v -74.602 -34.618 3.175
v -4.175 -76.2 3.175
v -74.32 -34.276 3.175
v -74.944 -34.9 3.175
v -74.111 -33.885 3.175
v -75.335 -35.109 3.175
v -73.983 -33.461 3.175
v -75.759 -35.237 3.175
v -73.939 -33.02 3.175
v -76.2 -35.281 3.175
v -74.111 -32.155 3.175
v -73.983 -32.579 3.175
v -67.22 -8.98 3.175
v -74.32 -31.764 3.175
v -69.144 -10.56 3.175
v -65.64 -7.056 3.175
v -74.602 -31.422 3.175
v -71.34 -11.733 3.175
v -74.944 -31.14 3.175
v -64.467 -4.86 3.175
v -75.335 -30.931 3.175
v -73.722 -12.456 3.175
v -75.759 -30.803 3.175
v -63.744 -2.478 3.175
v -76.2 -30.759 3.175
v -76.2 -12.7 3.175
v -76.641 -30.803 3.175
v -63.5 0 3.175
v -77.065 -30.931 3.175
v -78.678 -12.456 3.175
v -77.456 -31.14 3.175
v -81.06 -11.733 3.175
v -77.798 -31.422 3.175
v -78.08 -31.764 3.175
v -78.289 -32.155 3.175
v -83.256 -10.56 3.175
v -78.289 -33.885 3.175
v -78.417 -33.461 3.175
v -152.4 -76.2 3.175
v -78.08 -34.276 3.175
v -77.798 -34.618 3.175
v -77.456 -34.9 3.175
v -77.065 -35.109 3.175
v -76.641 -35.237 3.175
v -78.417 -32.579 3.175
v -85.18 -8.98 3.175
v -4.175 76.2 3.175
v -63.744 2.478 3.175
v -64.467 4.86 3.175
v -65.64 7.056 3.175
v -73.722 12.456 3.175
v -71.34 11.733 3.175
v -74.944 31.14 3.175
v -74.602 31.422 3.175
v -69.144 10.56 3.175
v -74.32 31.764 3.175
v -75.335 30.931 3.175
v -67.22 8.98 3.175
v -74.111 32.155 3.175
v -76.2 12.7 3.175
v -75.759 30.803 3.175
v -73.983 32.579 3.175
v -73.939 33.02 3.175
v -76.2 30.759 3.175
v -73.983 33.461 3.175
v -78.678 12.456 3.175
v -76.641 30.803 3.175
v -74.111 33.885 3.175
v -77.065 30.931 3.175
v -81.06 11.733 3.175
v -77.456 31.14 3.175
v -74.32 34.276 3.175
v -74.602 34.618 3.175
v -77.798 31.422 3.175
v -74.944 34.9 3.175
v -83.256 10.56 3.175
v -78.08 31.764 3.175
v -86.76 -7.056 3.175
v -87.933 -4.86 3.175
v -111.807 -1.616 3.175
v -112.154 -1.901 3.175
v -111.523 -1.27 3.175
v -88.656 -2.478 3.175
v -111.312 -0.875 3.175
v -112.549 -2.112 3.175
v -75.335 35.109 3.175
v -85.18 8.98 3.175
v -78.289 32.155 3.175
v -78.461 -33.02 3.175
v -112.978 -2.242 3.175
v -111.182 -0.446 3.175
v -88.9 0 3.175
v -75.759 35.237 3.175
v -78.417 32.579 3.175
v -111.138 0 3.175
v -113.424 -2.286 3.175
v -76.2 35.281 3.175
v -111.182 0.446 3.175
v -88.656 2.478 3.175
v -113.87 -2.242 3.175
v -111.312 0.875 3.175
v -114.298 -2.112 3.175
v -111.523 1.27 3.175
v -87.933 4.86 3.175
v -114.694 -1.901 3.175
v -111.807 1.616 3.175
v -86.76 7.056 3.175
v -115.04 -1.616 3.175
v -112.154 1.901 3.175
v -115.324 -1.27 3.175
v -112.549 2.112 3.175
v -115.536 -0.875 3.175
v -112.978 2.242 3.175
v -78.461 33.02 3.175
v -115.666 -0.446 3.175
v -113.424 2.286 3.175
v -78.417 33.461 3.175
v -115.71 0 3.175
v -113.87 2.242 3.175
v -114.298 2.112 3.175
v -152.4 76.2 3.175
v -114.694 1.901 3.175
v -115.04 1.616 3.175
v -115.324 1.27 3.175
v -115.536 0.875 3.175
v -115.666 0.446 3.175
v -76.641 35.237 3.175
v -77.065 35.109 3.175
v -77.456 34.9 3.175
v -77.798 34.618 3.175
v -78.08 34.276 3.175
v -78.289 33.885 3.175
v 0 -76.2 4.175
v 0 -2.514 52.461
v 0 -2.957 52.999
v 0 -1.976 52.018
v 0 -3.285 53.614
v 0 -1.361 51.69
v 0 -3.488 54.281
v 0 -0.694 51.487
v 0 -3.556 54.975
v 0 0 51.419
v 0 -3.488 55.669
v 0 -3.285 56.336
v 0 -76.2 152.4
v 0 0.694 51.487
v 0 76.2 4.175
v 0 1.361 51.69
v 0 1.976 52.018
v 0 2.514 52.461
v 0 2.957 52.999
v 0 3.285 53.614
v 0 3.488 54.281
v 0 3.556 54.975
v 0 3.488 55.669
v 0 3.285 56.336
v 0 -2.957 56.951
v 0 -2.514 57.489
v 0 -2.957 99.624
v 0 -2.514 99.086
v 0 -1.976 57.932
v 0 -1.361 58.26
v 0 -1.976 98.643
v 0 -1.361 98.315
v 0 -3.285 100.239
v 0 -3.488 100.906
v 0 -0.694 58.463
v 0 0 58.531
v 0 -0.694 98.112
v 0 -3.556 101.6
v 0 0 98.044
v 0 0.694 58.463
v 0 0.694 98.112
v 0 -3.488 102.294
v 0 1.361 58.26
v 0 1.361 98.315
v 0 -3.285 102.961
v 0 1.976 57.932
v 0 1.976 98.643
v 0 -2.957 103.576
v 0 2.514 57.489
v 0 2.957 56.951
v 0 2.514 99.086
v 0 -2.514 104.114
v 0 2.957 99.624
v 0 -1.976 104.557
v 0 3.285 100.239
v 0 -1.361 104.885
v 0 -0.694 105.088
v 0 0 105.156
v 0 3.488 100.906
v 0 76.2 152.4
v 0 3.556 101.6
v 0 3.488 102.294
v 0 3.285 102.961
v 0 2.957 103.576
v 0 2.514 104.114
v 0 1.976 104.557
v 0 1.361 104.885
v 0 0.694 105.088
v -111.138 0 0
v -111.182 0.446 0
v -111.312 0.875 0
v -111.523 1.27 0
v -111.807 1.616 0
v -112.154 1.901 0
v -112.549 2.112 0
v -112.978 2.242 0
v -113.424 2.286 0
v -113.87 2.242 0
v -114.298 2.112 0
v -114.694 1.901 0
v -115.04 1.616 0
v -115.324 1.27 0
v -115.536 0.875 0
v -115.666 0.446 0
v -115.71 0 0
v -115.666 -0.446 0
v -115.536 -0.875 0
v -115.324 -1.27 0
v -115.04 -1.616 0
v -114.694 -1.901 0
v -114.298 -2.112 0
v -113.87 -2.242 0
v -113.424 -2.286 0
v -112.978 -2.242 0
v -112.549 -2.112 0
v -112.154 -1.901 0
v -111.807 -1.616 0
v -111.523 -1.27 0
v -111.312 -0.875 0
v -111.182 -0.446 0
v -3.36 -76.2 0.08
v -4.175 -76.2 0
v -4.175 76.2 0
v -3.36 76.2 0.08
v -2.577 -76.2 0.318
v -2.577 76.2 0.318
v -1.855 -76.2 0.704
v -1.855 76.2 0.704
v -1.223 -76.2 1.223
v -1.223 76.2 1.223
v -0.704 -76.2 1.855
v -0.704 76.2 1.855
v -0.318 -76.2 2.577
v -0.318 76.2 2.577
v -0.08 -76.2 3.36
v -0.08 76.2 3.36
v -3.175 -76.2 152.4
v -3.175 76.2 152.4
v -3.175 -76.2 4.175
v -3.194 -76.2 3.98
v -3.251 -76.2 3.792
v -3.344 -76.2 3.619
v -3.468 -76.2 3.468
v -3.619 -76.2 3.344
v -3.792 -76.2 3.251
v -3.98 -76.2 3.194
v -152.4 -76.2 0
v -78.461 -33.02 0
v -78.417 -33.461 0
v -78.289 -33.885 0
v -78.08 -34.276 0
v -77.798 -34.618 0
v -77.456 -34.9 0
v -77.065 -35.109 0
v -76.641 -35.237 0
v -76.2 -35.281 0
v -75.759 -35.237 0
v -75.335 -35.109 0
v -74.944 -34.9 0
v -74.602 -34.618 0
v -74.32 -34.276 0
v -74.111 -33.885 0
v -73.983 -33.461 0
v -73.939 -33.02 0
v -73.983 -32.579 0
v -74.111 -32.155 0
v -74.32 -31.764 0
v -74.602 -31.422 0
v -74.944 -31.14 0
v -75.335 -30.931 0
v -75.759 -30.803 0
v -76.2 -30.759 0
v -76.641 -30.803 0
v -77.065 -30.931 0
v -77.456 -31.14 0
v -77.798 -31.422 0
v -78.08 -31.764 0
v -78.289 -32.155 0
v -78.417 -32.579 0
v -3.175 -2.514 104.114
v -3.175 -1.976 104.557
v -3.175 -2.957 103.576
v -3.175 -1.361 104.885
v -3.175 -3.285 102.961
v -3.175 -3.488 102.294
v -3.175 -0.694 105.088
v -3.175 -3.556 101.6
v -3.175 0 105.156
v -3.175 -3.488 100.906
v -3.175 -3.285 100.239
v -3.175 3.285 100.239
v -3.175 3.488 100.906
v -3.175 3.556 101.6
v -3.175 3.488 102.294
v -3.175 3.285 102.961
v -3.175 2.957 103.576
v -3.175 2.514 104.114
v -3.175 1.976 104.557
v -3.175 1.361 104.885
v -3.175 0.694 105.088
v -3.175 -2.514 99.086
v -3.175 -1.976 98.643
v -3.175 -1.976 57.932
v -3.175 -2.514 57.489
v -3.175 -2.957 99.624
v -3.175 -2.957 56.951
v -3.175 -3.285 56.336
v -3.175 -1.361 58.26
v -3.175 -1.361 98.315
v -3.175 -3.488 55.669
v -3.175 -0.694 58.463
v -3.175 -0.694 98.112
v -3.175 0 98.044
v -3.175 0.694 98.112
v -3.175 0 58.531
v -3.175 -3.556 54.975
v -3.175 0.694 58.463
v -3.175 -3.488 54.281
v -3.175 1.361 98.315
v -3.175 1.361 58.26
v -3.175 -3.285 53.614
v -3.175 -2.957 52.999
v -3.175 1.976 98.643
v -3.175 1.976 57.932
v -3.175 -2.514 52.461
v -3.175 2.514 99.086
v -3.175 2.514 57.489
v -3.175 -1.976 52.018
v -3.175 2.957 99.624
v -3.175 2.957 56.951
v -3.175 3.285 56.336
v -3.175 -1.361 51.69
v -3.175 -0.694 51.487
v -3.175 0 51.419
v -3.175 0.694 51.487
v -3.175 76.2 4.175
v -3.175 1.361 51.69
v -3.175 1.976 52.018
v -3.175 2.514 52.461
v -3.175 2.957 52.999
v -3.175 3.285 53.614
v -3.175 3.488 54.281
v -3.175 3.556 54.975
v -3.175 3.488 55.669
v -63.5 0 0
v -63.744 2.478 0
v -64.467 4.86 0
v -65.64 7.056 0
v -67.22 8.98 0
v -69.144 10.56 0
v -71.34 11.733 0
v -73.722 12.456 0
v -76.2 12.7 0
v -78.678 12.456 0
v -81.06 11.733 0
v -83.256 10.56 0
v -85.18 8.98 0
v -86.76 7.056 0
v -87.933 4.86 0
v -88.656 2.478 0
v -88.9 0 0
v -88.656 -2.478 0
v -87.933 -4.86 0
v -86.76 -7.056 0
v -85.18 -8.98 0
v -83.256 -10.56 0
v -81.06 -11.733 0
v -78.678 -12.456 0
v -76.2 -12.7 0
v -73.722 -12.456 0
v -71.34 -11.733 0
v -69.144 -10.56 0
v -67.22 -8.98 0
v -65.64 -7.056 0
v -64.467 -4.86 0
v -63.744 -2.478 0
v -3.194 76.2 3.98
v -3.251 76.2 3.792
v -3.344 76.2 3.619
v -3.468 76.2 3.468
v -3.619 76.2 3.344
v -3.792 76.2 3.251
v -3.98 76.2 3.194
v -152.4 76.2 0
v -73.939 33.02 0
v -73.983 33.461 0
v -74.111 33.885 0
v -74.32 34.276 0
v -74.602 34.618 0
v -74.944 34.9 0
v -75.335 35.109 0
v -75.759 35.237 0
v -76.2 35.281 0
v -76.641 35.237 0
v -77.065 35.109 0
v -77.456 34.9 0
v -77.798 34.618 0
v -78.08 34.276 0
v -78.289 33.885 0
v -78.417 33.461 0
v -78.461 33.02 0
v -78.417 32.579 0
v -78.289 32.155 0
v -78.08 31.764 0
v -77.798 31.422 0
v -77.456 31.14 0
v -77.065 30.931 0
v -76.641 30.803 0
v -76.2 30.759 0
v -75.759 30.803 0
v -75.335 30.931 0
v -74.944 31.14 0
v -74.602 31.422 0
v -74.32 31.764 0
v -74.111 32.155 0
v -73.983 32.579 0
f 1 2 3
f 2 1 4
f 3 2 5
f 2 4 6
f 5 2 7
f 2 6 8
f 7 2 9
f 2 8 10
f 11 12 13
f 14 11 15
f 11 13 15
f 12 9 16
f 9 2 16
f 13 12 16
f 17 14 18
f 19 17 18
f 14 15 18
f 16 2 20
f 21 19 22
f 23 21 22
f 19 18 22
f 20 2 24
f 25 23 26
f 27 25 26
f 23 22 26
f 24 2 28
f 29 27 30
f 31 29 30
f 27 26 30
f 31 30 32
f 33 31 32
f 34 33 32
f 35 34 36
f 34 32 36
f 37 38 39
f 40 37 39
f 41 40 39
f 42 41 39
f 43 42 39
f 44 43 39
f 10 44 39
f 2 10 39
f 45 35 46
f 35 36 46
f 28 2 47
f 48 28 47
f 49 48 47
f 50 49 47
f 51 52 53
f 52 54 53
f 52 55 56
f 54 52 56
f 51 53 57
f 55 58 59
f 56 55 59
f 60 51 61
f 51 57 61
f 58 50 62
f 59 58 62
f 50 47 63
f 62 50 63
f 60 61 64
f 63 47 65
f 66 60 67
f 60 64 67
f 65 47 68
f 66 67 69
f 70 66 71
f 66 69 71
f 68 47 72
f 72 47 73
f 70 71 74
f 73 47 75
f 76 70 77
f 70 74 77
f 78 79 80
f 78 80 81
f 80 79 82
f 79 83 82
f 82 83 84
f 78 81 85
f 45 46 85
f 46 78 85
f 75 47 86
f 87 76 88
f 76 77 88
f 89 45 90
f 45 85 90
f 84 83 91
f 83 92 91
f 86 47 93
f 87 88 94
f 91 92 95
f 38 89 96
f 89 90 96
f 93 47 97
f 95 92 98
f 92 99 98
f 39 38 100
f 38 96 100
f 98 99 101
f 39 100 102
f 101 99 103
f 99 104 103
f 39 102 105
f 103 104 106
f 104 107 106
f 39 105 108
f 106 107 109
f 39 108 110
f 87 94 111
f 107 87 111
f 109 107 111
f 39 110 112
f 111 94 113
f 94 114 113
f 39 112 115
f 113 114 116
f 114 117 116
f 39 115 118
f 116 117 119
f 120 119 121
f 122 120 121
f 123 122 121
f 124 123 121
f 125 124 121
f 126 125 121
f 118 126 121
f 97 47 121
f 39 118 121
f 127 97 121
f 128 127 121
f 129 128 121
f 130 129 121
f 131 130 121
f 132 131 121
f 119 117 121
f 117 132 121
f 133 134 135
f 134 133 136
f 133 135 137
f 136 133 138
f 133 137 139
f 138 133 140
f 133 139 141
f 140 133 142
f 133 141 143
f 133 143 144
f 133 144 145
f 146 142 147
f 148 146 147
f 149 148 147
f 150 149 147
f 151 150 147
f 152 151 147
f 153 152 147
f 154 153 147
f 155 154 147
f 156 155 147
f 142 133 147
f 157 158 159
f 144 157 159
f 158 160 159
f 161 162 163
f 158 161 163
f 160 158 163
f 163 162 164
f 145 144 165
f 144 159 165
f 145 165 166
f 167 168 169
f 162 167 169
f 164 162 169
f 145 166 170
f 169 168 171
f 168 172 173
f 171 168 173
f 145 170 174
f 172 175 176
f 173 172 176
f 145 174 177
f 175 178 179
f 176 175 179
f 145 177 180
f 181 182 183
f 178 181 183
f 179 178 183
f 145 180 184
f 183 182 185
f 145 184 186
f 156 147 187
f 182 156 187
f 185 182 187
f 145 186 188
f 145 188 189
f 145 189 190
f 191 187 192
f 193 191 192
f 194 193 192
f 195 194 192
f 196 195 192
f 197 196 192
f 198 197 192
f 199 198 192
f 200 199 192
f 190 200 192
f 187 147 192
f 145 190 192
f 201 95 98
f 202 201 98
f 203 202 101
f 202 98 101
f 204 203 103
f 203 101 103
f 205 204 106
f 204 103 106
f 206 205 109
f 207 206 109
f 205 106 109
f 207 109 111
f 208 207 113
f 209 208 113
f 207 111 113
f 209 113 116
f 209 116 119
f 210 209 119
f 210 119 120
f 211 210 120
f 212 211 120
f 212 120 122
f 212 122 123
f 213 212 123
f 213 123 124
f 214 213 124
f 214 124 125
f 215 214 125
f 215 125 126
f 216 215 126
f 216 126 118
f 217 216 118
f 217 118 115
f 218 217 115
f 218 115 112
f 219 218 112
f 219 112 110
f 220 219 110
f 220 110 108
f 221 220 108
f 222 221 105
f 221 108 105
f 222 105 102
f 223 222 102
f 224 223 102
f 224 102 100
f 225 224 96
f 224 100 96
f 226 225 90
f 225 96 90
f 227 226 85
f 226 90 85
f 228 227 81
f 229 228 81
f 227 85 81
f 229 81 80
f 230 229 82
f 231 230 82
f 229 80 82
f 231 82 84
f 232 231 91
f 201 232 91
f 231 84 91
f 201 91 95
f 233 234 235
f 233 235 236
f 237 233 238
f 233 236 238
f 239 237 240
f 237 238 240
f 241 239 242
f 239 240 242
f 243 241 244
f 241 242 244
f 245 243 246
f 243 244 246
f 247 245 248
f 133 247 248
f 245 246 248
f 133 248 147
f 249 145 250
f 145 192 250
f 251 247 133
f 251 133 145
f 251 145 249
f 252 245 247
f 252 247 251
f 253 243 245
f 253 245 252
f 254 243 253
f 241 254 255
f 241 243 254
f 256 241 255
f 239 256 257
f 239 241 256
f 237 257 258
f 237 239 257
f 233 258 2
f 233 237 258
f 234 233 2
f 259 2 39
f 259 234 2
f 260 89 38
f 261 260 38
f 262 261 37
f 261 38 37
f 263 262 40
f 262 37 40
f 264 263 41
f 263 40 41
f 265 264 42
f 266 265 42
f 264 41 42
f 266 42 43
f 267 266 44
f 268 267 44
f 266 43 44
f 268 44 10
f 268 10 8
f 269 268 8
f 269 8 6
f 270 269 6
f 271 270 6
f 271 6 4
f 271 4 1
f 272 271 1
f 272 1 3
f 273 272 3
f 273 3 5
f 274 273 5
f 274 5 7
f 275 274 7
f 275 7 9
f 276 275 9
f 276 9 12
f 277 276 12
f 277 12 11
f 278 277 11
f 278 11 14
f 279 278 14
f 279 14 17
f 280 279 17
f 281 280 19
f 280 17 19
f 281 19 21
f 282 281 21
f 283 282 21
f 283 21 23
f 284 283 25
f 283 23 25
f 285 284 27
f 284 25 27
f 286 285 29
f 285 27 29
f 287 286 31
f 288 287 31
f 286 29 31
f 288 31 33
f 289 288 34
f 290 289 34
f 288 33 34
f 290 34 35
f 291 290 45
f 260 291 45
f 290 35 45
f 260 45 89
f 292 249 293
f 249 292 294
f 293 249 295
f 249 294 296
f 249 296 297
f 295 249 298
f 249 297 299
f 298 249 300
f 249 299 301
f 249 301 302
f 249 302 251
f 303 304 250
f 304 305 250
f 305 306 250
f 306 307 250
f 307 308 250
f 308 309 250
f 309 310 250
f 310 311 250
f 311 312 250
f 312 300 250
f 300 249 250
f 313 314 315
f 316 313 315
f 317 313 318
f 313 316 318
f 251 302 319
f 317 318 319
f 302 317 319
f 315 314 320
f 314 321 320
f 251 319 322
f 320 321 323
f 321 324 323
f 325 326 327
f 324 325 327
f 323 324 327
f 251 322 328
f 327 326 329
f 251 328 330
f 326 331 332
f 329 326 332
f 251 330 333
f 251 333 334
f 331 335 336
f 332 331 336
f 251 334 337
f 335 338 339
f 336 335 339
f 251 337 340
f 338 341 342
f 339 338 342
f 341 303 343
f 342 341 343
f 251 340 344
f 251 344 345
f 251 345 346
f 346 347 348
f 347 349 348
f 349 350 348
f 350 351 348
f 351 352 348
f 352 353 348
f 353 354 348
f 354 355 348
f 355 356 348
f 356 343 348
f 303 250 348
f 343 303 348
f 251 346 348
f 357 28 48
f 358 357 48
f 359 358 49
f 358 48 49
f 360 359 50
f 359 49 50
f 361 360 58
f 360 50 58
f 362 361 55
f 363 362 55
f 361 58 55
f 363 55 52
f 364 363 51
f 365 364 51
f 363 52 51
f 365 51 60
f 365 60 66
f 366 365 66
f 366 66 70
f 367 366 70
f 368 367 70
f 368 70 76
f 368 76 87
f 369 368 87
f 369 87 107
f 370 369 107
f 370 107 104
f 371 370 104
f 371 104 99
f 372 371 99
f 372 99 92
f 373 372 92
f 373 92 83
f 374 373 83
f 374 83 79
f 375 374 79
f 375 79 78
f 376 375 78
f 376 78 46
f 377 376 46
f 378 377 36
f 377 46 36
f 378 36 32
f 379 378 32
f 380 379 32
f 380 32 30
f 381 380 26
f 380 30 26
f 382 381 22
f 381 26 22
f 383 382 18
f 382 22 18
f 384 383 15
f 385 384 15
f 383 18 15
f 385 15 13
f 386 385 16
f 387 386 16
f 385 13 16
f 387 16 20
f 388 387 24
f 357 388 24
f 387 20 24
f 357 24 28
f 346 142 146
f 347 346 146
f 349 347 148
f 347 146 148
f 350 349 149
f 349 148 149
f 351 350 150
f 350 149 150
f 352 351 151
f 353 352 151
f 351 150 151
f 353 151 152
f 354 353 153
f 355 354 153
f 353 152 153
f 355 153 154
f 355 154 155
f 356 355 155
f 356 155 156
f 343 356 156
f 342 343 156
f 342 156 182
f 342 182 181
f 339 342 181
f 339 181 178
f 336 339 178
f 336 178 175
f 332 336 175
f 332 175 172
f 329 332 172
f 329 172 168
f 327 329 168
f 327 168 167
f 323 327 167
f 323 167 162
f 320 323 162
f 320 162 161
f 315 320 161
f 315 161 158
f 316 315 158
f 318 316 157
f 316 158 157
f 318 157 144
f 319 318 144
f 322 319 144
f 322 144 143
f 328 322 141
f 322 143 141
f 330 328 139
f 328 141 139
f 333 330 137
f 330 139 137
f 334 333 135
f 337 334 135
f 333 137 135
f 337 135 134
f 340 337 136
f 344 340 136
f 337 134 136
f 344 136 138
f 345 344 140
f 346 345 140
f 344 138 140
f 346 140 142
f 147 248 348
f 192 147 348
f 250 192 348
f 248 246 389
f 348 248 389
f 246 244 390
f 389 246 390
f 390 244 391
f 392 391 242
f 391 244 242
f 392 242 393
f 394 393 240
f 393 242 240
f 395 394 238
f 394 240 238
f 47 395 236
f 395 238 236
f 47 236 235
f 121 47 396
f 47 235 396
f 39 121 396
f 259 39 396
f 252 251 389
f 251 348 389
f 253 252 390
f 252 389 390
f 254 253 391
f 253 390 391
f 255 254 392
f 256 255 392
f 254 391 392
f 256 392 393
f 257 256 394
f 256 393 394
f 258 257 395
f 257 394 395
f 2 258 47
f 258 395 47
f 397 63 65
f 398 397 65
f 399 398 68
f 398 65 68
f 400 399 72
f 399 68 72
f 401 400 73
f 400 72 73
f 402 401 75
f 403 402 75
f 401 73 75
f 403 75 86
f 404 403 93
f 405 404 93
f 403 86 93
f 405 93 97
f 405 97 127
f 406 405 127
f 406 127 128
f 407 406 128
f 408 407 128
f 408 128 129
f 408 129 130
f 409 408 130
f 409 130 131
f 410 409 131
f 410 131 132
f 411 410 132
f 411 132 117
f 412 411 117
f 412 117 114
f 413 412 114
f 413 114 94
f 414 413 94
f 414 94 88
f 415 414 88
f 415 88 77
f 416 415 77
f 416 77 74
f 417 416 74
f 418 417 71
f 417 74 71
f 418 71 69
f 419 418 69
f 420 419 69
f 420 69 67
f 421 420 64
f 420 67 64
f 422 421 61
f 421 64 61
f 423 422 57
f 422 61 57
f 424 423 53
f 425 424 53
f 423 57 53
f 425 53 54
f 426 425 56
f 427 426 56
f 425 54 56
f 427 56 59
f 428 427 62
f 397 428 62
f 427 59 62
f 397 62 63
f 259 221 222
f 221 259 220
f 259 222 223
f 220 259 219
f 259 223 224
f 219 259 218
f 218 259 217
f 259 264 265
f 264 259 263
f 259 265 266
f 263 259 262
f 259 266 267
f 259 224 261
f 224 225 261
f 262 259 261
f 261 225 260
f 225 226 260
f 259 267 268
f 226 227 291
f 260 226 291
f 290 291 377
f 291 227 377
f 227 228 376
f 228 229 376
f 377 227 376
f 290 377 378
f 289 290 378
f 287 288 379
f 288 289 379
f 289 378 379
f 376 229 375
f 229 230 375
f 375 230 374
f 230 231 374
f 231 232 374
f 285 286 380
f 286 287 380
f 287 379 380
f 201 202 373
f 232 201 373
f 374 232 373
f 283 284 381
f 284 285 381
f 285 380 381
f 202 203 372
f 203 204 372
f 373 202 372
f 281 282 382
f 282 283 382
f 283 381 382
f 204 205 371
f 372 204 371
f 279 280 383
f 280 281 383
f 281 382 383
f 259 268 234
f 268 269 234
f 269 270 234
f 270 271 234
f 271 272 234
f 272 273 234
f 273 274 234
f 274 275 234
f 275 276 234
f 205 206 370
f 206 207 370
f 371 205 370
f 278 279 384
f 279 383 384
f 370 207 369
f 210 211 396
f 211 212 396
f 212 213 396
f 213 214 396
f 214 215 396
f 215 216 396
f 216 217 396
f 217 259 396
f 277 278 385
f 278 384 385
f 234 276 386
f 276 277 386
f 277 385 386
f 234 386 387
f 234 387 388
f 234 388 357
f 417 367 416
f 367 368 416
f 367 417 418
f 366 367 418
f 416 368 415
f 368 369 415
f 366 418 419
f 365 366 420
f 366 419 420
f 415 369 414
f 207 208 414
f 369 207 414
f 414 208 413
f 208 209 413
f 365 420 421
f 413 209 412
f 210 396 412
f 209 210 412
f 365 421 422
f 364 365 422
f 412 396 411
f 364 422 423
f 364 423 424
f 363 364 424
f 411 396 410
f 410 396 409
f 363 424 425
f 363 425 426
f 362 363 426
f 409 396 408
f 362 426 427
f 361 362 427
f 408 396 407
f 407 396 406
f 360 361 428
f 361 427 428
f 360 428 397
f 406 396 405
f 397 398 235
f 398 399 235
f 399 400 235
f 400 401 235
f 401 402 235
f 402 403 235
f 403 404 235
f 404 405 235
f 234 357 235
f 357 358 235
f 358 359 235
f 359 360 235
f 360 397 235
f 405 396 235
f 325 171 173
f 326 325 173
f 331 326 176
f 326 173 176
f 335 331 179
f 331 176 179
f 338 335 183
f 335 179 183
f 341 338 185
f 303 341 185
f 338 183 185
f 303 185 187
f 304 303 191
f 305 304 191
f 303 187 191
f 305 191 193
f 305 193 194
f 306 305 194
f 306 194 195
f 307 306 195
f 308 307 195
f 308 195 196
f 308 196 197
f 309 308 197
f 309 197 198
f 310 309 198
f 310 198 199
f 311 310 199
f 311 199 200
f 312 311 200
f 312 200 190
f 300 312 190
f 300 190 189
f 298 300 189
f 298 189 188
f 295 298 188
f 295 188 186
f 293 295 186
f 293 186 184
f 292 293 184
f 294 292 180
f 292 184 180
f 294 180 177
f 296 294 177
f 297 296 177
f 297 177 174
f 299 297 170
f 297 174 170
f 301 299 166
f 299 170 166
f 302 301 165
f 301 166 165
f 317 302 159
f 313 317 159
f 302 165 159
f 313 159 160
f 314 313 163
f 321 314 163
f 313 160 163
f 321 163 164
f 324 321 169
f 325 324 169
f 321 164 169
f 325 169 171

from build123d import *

# Parameters (mm, degrees)
BASE_FLANGE1_DEPTH = 76.2
SKETCH6_R          = 12.7
CUT_EXTRUDE1_DEPTH = 227.495696703
SKETCH7_R          = 2.2606
CUT_EXTRUDE2_DEPTH = 227.495696703
SKETCH9_R          = 2.286
CUT_EXTRUDE3_DEPTH = 227.495696703
SKETCH10_R         = 3.556
CUT_EXTRUDE4_DEPTH = 229.6


# Sheet-metal steps are written as plain solids
with BuildPart() as part:
    # Sketch1 → Base-Flange1 (new, symmetric)
    with BuildSketch(Plane(origin=(0, 0, 0), x_dir=(1, 0, 0), z_dir=(0, 1, 0))):
        with BuildLine():
            Line((-152.4, 0), (-4.175, 0))
            ThreePointArc((-4.175, 0), (-1.222829189, -1.222829189), (0, -4.175))
            Line((0, -4.175), (0, -152.4))
            Line((0, -152.4), (-3.175, -152.4))
            Line((-3.175, -152.4), (-3.175, -4.175))
            ThreePointArc((-3.175, -4.175), (-3.467893219, -3.467893219), (-4.175, -3.175))
            Line((-4.175, -3.175), (-152.4, -3.175))
            Line((-152.4, -3.175), (-152.4, 0))
        make_face()
    extrude(amount=BASE_FLANGE1_DEPTH, both=True)

    # Sketch6 → Cut-Extrude1 (cut, through all)
    with BuildSketch(Plane.XY.offset(3.175)):
        with Locations((-76.2, 0)):
            Circle(SKETCH6_R)
    extrude(amount=-CUT_EXTRUDE1_DEPTH, mode=Mode.SUBTRACT)

    # Sketch7 → Cut-Extrude2 (cut, through all)
    with BuildSketch(Plane.XY.offset(3.175)):
        with Locations((-76.2, 33.02)):
            Circle(SKETCH7_R)
        with Locations(Location((-76.2, -33.02, 0), (0, 0, 180))):
            Circle(SKETCH7_R)
    extrude(amount=-CUT_EXTRUDE2_DEPTH, mode=Mode.SUBTRACT)

    # Sketch9 → Cut-Extrude3 (cut, through all)
    with BuildSketch(Plane.XY.offset(3.175)):
        with Locations((-113.42361984, 0)):
            Circle(SKETCH9_R)
    extrude(amount=-CUT_EXTRUDE3_DEPTH, mode=Mode.SUBTRACT)

    # Sketch10 → Cut-Extrude4 (cut, through all)
    with BuildSketch(Plane(origin=(0, 0, 0), x_dir=(0, 0, -1), z_dir=(1, 0, 0))):
        with Locations((-54.975, 0)):
            Circle(SKETCH10_R)
        with Locations((-101.6, 0)):
            Circle(SKETCH10_R)
    extrude(amount=-CUT_EXTRUDE4_DEPTH, mode=Mode.SUBTRACT)


solid = part.part
